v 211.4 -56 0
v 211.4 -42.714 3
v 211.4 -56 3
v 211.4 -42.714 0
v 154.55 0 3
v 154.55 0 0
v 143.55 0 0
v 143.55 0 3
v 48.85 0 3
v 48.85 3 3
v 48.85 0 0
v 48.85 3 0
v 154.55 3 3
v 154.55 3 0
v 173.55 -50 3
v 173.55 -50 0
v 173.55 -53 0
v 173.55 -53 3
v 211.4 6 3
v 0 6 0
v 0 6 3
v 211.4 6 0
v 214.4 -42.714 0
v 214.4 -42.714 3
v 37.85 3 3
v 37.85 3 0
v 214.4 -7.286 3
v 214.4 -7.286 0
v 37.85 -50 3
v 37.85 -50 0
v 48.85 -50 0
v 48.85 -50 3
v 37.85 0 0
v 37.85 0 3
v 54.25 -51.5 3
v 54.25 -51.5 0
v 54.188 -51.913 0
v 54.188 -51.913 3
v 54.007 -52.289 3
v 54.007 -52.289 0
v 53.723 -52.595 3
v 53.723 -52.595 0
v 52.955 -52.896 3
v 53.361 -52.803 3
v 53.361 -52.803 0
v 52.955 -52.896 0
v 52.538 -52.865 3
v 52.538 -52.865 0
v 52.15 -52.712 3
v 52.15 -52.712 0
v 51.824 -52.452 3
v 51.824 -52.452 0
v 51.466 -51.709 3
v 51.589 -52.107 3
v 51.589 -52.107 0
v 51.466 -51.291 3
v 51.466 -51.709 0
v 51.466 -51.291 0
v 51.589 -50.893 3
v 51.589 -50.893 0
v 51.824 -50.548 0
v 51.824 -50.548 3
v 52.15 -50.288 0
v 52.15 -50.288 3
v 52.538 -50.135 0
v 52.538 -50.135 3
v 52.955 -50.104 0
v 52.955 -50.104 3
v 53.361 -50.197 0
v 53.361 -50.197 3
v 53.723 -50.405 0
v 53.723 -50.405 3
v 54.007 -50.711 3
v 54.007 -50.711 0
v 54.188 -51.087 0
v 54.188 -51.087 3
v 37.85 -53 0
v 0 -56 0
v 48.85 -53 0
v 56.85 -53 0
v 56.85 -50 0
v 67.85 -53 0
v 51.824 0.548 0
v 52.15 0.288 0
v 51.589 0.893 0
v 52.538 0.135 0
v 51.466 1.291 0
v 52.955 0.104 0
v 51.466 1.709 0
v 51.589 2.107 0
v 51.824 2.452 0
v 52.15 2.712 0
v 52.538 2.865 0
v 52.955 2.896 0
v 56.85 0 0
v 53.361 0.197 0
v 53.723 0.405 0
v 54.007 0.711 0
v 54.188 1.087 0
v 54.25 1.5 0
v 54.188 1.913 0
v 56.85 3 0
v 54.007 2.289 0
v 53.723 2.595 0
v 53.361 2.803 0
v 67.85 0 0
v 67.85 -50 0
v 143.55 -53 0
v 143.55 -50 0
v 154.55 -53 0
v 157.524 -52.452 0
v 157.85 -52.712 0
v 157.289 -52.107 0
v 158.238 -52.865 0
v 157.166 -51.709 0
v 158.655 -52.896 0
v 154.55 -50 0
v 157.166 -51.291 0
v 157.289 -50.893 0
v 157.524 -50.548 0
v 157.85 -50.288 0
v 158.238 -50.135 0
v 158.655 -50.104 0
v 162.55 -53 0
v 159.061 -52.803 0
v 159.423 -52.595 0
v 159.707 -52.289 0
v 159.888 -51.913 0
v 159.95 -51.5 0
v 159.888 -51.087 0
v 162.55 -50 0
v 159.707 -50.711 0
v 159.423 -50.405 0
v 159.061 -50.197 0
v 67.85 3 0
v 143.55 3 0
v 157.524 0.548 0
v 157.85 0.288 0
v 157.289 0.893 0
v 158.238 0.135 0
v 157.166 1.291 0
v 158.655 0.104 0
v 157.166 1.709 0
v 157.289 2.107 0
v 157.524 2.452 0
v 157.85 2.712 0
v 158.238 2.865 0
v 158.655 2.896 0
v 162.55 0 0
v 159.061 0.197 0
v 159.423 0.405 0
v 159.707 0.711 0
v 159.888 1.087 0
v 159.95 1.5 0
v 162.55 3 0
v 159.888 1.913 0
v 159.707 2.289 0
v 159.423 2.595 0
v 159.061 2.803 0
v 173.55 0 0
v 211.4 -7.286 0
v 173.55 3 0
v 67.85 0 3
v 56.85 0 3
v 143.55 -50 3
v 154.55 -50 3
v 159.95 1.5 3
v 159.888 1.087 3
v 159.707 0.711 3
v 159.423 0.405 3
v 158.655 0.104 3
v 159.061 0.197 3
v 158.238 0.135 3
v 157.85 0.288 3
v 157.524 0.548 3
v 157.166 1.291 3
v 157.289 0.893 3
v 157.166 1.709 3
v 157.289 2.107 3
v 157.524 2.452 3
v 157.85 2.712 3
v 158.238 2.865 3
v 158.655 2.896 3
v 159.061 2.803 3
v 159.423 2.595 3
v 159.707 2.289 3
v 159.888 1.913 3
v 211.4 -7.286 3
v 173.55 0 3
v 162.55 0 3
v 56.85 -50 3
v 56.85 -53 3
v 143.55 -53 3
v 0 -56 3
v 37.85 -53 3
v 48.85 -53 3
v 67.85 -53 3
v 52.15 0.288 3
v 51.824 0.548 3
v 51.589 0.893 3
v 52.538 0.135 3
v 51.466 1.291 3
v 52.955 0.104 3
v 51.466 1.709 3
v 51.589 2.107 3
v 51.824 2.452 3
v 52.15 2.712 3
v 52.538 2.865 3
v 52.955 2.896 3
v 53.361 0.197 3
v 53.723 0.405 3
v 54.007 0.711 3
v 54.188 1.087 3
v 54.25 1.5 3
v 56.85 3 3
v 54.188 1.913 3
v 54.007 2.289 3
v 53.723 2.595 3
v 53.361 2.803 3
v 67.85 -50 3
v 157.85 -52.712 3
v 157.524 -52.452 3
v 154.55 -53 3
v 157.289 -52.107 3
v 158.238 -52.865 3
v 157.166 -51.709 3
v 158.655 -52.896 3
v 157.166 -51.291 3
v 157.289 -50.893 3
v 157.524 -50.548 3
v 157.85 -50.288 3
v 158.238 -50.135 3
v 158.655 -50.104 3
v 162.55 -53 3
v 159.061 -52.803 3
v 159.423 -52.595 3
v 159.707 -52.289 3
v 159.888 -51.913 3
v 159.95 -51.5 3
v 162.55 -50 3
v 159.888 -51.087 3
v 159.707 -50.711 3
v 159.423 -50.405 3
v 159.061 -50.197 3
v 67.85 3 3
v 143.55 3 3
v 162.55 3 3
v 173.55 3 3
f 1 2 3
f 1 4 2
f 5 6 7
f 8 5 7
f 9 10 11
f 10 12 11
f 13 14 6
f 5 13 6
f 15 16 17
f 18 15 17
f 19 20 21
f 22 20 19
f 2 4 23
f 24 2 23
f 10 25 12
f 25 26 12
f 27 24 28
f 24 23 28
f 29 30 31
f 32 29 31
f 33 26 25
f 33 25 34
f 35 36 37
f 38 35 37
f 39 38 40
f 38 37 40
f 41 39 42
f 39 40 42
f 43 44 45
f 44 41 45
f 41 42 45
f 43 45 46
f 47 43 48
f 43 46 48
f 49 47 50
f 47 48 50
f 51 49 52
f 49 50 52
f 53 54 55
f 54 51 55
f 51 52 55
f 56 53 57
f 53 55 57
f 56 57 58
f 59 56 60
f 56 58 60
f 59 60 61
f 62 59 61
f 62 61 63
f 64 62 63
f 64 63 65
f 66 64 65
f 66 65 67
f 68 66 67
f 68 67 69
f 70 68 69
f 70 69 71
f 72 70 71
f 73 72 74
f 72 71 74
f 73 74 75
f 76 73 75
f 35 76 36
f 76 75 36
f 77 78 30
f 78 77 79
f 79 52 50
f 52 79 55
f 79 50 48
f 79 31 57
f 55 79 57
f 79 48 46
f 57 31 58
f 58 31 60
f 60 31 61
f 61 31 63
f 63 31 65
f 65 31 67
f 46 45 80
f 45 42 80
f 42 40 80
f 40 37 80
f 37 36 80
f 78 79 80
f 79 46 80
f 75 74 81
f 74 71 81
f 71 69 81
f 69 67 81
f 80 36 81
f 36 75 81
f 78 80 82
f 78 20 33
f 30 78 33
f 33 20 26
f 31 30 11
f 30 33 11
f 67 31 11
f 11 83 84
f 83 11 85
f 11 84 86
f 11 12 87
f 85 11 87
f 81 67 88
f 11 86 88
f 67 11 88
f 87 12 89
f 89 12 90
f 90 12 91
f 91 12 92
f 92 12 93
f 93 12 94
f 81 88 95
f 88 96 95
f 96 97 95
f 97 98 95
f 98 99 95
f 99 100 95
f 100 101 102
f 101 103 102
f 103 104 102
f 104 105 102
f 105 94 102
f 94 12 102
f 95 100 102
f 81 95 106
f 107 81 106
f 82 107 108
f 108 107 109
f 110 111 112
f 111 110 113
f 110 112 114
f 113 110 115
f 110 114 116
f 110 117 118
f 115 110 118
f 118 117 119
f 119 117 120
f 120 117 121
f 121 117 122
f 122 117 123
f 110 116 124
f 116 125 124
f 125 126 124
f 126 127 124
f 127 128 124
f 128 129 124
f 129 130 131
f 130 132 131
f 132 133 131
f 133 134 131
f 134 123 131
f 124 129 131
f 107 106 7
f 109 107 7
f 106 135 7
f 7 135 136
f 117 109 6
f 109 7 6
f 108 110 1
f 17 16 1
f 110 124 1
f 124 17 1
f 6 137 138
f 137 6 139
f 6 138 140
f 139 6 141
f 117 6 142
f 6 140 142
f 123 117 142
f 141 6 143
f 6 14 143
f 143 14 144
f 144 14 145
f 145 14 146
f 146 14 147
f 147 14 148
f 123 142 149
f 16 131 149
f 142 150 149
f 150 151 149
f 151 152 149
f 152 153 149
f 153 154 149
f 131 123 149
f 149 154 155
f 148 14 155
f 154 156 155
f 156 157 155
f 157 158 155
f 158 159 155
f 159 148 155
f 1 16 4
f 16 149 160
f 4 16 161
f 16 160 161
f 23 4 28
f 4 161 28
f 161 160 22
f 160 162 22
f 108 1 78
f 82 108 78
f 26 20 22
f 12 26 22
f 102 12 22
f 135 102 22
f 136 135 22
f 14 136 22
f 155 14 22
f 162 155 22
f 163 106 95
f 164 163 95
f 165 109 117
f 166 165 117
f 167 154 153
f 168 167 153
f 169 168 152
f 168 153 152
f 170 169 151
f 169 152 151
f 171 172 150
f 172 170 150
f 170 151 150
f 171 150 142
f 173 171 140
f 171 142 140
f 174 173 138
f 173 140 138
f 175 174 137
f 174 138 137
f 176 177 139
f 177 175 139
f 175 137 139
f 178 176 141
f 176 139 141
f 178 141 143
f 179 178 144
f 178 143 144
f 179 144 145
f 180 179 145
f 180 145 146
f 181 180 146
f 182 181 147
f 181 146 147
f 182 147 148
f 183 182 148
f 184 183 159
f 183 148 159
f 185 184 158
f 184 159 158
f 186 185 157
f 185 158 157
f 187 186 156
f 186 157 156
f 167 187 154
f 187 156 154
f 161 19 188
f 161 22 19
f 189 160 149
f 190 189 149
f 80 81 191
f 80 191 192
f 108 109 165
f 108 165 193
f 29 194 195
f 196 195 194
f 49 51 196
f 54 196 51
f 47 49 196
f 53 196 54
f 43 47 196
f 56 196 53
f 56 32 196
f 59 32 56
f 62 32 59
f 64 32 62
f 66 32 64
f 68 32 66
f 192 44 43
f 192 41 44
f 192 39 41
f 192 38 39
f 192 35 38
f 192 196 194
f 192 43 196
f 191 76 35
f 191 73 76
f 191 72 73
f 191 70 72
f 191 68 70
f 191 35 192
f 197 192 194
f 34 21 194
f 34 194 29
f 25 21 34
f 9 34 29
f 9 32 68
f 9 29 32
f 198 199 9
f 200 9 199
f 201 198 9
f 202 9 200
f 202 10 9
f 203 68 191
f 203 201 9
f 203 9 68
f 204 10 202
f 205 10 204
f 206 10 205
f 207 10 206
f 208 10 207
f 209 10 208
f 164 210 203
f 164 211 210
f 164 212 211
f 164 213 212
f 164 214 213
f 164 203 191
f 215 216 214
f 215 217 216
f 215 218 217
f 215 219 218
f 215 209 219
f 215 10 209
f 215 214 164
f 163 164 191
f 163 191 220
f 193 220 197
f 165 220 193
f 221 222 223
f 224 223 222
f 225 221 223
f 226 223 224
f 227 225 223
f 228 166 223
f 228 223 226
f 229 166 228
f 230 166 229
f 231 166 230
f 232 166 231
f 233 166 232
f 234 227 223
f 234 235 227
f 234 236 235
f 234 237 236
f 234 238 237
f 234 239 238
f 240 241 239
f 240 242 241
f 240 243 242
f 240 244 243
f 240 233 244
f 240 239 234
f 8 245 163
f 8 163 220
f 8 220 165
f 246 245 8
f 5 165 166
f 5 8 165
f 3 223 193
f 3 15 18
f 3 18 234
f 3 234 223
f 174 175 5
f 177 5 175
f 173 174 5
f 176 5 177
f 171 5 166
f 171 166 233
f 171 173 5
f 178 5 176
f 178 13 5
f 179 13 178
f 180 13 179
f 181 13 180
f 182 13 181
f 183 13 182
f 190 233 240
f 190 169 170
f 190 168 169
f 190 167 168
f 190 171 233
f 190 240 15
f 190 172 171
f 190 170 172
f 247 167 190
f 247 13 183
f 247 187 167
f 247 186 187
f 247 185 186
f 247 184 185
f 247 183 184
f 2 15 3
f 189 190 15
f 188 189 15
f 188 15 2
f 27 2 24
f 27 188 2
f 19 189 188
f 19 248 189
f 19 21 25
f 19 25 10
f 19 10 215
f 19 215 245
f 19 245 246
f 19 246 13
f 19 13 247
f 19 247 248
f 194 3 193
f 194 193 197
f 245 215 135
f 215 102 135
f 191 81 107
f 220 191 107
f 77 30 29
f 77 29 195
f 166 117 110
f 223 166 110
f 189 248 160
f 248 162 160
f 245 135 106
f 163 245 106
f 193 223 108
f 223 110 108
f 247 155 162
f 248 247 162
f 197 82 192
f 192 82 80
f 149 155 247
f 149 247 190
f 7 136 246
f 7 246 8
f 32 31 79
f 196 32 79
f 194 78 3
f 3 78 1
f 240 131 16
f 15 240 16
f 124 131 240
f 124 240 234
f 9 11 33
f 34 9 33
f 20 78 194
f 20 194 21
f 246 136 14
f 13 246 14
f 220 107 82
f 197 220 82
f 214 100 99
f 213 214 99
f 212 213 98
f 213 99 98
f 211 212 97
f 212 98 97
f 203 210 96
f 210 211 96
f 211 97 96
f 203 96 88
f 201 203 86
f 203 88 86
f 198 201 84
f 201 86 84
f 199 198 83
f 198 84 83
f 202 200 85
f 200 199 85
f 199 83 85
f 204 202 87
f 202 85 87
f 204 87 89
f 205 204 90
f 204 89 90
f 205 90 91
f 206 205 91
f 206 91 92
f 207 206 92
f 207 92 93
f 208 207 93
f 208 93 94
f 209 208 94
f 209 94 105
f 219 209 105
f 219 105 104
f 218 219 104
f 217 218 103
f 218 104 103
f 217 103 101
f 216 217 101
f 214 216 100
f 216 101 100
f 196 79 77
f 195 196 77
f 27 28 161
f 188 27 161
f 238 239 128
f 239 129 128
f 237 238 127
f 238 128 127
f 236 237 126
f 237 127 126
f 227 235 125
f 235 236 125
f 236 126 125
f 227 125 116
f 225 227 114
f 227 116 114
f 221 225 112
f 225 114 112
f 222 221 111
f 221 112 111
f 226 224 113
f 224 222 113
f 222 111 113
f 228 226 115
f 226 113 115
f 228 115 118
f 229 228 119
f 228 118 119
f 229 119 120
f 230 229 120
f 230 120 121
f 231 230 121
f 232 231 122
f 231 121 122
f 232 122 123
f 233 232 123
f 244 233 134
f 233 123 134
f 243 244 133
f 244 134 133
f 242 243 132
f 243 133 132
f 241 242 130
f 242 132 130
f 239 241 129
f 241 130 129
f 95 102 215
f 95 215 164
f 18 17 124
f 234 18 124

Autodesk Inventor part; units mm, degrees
ref_plane "YZ Plane" through (0, 0, 0) normal (1, 0, 0) x (0, 1, 0)
ref_plane "XZ Plane" through (0, 0, 0) normal (0, 1, 0) x (-1, 0, 0)
ref_plane "XY Plane" through (0, 0, 0) normal (0, 0, 1) x (1, 0, 0)
sketch "Sketch1" plane through (0, 0, 0) normal (0, 0, 1) x (1, 0, 0)
  line L0 (0, 6) -> (211.4, 6)
  line L1 (211.4, 6) -> (211.4, -53)
  line L2 (211.4, -53) -> (0, -53)
  line L3 (0, -53) -> (0, 6)
  line L4 (214.4, 3) -> (214.4, 0) projected
  line L5 (37.85, -53) -> (0, -53) projected
  line L6 (0, 6) -> (211.4, 6) projected
  line L7 (211.4, 3) -> (211.4, 6) projected
  line L8 (0, -53) -> (0, -56)
  line L9 (0, -56) -> (211.4, -56)
  line L10 (211.4, -56) -> (211.4, -53)
  line L11 (211.4, -42.7143) -> (214.4, -42.7143)
  line L12 (214.4, -42.7143) -> (214.4, -7.2857)
  line L13 (214.4, -7.2857) -> (211.4, -7.2857)
  line L14 (-8.1633, -25) -> (265.4045, -25) construction
  line L15 (37.85, 3) -> (48.85, 3) projected
  line L16 (37.85, 3) -> (37.85, 0) projected
  line L17 (48.85, 0) -> (37.85, 0) projected
  line L18 (48.85, 3) -> (48.85, 0) projected
  line L19 (56.85, 3) -> (67.85, 3) projected
  line L20 (56.85, 3) -> (56.85, 0) projected
  line L21 (67.85, 0) -> (56.85, 0) projected
  line L22 (67.85, 3) -> (67.85, 0) projected
  line L23 (143.55, 3) -> (154.55, 3) projected
  line L24 (143.55, 3) -> (143.55, 0) projected
  line L25 (154.55, 0) -> (143.55, 0) projected
  line L26 (154.55, 3) -> (154.55, 0) projected
  line L27 (162.55, 3) -> (173.55, 3) projected
  line L28 (162.55, 3) -> (162.55, 0) projected
  line L29 (173.55, 0) -> (162.55, 0) projected
  line L30 (173.55, 3) -> (173.55, 0) projected
  line L31 (162.55, -50) -> (173.55, -50) projected
  line L32 (162.55, -50) -> (162.55, -53) projected
  line L33 (173.55, -53) -> (162.55, -53) projected
  line L34 (173.55, -50) -> (173.55, -53) projected
  line L35 (143.55, -50) -> (154.55, -50) projected
  line L36 (143.55, -50) -> (143.55, -53) projected
  line L37 (154.55, -53) -> (143.55, -53) projected
  line L38 (154.55, -50) -> (154.55, -53) projected
  line L39 (56.85, -50) -> (67.85, -50) projected
  line L40 (56.85, -50) -> (56.85, -53) projected
  line L41 (67.85, -53) -> (56.85, -53) projected
  line L42 (67.85, -50) -> (67.85, -53) projected
  line L43 (37.85, -50) -> (48.85, -50) projected
  line L44 (37.85, -50) -> (37.85, -53) projected
  line L45 (48.85, -53) -> (37.85, -53) projected
  line L46 (48.85, -50) -> (48.85, -53) projected
  line L47 (143.55, -53) -> (154.55, -53)
  line L48 (154.55, -53) -> (154.55, -50)
  line L49 (154.55, -50) -> (143.55, -50)
  line L50 (143.55, -50) -> (143.55, -53)
  line L51 (162.55, -53) -> (173.55, -53)
  line L52 (173.55, -53) -> (173.55, -50)
  line L53 (173.55, -50) -> (162.55, -50)
  line L54 (162.55, -50) -> (162.55, -53)
  line L55 (56.85, -53) -> (67.85, -53)
  line L56 (67.85, -53) -> (67.85, -50)
  line L57 (67.85, -50) -> (56.85, -50)
  line L58 (56.85, -50) -> (56.85, -53)
  line L59 (48.85, -53) -> (37.85, -53)
  line L60 (37.85, -53) -> (37.85, -50)
  line L61 (37.85, -50) -> (48.85, -50)
  line L62 (48.85, -50) -> (48.85, -53)
  line L63 (211.4, -56) -> (0, -56)
  line L64 (0, -56) -> (0, -53)
  line L65 (0, -53) -> (211.4, -53)
  line L66 (211.4, -53) -> (211.4, -56)
  line L67 (154.55, 0) -> (162.55, 3) construction
  line L68 (154.55, 3) -> (162.55, 0) construction
  line L69 (48.85, 3) -> (56.85, 0) construction
  line L70 (48.85, 0) -> (56.85, 3) construction
  line L71 (48.85, -50) -> (56.85, -53) construction
  line L72 (48.85, -53) -> (56.85, -50) construction
  line L73 (154.55, -53) -> (162.55, -50) construction
  line L74 (154.55, -50) -> (162.55, -53) construction
  circle A0 centre (158.55, 1.5) radius 1.4
  circle A1 centre (52.85, 1.5) radius 1.4
  circle A2 centre (52.85, -51.5) radius 1.4
  circle A3 centre (158.55, -51.5) radius 1.4
  point P0 (0, 0)
  dimension "d0" = 3
  dimension "d1" = 3
  dimension "d2" = 62
  dimension "d3" = 31
  dimension "d4" = 35.4286
  dimension "d7" = 2.8
  dimension "d8" = 2.8
  dimension "d9" = 2.8
  dimension "d10" = 2.8
extrude "Extrusion1" add sketch "Sketch1" along normal blind 3 contours L0 L1 L2 L34 L31 L32 L38 L35 L36 L42 L39 L40 L46 L43 L44 L3 | L2 L10 L9 L8 | L13 L12 L11 L1
equation "\"d3\" = 0.5 * d2"
equation "\"d4\" = 0.571429 * d2"
properties part number "slider-holder_side"
